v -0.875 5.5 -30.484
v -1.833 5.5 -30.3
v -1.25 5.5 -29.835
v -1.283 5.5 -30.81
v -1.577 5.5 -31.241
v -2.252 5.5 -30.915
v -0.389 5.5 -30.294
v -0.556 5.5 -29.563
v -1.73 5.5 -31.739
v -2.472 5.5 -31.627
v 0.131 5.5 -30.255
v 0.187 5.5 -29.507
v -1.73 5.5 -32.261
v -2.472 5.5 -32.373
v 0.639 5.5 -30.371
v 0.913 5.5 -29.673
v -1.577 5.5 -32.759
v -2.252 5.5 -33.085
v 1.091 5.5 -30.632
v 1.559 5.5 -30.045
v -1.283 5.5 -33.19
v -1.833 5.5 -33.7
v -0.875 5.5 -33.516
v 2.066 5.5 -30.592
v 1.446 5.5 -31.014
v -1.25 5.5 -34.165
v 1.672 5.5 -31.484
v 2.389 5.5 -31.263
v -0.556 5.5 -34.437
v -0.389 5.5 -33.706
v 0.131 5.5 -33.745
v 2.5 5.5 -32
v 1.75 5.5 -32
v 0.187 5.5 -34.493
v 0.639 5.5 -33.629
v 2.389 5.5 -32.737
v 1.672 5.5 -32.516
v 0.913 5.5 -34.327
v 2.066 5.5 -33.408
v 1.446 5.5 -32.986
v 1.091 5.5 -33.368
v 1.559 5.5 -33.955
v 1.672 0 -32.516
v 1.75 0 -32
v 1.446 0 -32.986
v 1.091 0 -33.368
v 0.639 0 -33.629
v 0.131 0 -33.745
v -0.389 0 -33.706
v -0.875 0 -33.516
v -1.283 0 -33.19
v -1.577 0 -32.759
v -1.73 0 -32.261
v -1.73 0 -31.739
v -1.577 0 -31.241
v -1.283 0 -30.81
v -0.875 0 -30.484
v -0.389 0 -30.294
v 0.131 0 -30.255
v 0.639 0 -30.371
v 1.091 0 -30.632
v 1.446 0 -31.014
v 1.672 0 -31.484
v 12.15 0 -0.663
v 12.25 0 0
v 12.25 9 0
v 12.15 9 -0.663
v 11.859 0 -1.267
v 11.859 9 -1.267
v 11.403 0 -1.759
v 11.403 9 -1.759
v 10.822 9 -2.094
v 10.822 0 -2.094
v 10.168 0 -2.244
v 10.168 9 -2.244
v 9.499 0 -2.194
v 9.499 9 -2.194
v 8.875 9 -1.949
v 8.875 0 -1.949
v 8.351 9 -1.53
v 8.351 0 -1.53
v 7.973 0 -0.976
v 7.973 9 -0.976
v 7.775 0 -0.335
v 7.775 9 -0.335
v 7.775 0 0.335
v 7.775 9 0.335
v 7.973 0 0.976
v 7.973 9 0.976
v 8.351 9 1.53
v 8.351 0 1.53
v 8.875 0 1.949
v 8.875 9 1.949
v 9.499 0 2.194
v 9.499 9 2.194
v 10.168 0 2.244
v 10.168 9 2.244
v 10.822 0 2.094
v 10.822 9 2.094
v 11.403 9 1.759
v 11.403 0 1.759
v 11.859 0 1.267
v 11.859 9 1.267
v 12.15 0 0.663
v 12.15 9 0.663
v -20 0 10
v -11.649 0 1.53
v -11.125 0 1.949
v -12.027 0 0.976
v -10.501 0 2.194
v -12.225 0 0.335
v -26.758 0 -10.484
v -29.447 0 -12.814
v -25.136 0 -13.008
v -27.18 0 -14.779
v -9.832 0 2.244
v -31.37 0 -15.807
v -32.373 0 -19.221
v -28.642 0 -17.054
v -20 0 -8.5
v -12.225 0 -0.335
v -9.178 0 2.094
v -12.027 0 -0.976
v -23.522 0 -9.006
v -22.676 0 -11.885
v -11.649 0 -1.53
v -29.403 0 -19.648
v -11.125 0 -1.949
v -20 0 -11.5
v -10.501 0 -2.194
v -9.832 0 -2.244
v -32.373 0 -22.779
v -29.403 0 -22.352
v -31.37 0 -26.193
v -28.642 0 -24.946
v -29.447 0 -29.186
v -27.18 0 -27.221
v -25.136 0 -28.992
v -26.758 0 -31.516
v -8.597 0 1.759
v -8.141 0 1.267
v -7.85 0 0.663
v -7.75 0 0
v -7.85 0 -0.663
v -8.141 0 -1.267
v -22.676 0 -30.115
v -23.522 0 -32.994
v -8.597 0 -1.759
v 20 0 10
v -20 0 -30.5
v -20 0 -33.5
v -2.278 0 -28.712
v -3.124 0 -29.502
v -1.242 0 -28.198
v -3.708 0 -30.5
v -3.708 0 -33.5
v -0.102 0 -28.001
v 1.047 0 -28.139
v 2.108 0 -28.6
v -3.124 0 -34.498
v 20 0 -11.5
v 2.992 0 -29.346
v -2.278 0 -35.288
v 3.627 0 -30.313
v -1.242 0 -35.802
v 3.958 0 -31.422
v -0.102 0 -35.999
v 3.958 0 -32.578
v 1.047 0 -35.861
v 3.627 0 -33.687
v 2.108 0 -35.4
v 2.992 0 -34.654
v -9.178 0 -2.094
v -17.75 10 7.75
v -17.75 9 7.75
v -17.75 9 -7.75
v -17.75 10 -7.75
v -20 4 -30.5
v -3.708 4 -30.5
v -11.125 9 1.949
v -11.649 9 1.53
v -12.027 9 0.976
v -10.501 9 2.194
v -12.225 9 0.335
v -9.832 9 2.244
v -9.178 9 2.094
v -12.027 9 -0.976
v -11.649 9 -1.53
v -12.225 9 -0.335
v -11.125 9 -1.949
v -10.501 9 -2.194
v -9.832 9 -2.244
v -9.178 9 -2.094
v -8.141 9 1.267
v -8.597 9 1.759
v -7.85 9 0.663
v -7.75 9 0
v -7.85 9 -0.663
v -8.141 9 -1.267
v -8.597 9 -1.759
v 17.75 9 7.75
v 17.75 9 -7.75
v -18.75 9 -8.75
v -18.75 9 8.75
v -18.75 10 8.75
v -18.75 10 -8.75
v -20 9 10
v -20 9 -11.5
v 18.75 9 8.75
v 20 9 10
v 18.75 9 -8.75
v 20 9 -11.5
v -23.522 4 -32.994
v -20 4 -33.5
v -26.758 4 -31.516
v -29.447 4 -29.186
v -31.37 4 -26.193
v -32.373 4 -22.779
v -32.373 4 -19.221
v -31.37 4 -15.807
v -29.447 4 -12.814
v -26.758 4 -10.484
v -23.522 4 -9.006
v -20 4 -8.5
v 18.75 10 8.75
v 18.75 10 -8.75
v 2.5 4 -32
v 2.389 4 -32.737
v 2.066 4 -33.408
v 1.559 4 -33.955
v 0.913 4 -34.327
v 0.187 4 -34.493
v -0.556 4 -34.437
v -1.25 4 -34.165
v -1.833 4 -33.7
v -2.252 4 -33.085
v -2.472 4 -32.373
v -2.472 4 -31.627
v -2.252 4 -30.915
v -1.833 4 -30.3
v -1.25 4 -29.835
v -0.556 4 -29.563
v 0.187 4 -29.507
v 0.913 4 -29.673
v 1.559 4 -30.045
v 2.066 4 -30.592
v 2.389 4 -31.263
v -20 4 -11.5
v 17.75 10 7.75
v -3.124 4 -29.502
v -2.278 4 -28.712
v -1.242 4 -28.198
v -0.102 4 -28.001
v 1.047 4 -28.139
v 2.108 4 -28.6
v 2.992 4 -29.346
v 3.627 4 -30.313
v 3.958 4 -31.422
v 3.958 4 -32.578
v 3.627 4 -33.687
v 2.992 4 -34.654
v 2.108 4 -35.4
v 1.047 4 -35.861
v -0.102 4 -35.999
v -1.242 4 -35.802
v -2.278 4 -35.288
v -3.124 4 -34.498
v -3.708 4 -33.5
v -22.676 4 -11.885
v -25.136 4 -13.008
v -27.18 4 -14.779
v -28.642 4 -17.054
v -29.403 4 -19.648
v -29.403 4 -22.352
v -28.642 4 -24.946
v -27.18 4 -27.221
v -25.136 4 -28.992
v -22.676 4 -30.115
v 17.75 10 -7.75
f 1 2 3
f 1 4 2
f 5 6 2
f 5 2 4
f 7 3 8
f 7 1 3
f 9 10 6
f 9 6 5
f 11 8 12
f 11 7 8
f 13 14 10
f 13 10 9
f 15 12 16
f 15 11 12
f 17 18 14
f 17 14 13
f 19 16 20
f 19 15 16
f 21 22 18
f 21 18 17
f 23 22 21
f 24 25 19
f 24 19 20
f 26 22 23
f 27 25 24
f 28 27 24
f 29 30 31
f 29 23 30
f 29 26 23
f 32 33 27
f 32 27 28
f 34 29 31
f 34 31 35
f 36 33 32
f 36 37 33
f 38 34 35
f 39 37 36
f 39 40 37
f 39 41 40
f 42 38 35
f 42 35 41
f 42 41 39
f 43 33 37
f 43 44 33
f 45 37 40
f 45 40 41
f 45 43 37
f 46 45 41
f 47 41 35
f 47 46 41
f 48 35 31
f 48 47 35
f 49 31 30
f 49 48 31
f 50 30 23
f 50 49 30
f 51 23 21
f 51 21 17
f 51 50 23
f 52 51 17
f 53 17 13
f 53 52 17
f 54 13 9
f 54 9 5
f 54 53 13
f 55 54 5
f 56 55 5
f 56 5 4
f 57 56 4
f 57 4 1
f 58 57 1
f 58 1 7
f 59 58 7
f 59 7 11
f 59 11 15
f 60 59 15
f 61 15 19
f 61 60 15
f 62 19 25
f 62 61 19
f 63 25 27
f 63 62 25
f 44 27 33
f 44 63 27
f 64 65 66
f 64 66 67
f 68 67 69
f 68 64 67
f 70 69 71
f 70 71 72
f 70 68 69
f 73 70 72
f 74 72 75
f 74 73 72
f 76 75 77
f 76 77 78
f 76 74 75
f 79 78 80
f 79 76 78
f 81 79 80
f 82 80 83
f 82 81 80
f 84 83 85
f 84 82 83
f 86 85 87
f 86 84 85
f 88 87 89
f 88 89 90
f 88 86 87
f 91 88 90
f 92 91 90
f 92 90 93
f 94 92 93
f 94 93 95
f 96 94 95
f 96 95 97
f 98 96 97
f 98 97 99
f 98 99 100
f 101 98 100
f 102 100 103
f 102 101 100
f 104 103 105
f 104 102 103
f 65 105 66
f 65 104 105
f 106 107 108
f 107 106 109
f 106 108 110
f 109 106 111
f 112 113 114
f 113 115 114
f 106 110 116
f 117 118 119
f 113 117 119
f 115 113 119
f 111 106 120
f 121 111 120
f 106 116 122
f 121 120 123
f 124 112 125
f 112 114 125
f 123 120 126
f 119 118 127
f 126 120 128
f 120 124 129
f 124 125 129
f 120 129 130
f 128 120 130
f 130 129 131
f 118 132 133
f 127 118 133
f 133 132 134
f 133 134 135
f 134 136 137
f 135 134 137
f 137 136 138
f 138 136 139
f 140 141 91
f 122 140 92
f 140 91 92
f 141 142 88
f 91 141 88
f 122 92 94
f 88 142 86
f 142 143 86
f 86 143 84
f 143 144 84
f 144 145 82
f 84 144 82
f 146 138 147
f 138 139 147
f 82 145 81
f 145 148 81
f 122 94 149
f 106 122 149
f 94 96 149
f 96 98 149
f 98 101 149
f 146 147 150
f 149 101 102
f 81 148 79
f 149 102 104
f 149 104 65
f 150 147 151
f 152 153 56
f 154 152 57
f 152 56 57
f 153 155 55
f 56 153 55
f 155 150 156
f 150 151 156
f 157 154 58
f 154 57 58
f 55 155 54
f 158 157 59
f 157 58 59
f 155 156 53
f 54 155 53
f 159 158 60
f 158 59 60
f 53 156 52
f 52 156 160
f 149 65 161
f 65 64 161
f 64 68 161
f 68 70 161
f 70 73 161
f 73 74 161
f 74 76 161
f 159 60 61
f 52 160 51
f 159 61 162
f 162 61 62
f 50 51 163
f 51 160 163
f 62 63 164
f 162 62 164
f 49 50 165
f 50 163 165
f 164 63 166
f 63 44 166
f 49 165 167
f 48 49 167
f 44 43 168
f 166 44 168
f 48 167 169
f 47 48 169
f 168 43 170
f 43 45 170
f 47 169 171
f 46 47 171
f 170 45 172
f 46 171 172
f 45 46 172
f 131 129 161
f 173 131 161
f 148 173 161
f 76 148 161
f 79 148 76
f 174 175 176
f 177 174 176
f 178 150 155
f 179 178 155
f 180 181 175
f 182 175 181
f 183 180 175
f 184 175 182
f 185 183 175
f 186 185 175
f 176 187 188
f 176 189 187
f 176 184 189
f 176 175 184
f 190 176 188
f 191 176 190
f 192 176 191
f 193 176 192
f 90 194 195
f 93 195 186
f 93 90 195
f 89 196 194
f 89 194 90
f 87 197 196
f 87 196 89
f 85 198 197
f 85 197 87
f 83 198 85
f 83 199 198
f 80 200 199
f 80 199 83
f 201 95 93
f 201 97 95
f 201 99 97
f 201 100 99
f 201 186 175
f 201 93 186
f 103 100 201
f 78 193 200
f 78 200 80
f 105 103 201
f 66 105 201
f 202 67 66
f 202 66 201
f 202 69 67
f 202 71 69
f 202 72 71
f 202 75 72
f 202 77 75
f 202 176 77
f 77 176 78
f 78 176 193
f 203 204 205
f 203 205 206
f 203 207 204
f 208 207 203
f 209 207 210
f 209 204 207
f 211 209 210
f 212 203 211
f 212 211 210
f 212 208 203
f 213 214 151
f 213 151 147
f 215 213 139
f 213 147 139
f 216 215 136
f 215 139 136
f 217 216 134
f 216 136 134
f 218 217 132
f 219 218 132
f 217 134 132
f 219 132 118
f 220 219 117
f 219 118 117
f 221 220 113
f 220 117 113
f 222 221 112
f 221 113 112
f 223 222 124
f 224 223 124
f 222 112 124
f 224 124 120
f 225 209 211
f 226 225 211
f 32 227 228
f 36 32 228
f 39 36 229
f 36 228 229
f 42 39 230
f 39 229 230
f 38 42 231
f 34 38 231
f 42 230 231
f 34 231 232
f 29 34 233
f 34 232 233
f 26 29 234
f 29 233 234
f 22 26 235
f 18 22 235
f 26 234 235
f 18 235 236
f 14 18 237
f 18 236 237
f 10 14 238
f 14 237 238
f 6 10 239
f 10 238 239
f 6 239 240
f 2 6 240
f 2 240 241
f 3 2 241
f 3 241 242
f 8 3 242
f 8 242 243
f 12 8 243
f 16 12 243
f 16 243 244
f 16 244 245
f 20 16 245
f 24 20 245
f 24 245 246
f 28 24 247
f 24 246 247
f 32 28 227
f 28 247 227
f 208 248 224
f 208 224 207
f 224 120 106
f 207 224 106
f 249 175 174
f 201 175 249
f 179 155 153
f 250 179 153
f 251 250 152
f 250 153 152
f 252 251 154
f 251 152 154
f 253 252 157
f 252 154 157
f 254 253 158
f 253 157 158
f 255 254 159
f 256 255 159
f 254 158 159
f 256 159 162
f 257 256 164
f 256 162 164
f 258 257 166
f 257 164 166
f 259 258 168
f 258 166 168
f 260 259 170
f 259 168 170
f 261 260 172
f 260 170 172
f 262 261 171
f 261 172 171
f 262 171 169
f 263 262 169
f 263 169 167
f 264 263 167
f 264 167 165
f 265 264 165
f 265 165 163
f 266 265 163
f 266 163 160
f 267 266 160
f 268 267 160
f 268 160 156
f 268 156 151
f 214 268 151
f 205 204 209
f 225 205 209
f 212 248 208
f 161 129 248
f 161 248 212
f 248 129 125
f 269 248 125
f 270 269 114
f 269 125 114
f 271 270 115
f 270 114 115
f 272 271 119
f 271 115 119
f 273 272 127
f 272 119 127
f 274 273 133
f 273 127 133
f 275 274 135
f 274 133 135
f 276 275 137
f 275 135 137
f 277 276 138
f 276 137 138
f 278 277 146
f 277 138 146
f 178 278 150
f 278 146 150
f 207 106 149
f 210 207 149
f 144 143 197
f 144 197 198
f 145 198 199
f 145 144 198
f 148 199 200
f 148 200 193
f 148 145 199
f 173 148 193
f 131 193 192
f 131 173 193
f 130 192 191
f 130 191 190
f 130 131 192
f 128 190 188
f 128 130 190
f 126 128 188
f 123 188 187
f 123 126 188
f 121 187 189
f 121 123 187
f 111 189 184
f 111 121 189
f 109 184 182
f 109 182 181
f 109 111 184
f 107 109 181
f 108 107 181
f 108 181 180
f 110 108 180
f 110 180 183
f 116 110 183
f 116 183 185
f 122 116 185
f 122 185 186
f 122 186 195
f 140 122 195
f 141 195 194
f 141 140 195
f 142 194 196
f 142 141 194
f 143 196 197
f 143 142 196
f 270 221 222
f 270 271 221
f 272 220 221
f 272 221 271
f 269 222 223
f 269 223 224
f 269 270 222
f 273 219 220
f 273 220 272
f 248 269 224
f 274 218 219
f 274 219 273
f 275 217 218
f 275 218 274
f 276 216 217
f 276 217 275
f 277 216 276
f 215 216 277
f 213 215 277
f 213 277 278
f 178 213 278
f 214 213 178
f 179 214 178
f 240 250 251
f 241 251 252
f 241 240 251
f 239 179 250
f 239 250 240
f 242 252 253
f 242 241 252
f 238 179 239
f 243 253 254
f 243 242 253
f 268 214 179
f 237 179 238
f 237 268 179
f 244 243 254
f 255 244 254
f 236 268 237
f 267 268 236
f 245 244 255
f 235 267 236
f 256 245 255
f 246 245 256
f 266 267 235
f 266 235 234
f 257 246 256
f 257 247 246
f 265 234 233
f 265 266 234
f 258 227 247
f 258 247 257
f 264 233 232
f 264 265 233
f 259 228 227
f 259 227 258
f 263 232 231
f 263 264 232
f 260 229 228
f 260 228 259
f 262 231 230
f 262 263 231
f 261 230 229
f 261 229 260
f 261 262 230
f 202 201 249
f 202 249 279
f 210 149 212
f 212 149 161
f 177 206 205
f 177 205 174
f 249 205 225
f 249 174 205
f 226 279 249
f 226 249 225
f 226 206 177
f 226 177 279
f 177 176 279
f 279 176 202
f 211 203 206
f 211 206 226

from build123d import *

# Parameters (mm, degrees)
SKETCH1_W           = 40
SKETCH1_H           = 21.5
SKETCH1_R           = 2.25
BOSS_EXTRUDE3_DEPTH = 9
SKETCH1_5_R         = 1.75
BOSS_EXTRUDE4_DEPTH = 4
SKETCH2_R           = 2.5
SKETCH2_R_2         = 1.75
BOSS_EXTRUDE5_DEPTH = 1.5
SKETCH3_W           = 37.5
SKETCH3_H           = 17.5
SKETCH3_W_2         = 35.5
SKETCH3_H_2         = 15.5
BOSS_EXTRUDE6_DEPTH = 1


with BuildPart() as part:
    # Sketch1 → Boss-Extrude3 (new body)
    with BuildSketch(Plane(origin=(0, 0, 0), x_dir=(1, 0, 0), z_dir=(0, 1, 0))):
        with Locations((0, 0.75)):
            Rectangle(SKETCH1_W, SKETCH1_H)
        with Locations((10, 0)):
            Circle(SKETCH1_R, mode=Mode.SUBTRACT)
        with Locations((-10, 0)):
            Circle(SKETCH1_R, mode=Mode.SUBTRACT)
    extrude(amount=BOSS_EXTRUDE3_DEPTH)

    # Sketch1<5> → Boss-Extrude4 (add)
    with BuildSketch(Plane(origin=(0, 0, 0), x_dir=(1, 0, 0), z_dir=(0, 1, 0))):
        with BuildLine():
            ThreePointArc((-20, 33.5), (-32.5, 21), (-20, 8.5))
            Line((-20, 8.5), (-20, 10))
            Line((-20, 10), (-20, 11.5))
            ThreePointArc((-20, 11.5), (-29.5, 21), (-20, 30.5))
            Line((-20, 30.5), (-3.708099244, 30.5))
            ThreePointArc((-3.708099244, 30.5), (4, 32), (-3.708099244, 33.5))
            Line((-3.708099244, 33.5), (-20, 33.5))
        make_face()
        with Locations((0, 32)):
            Circle(SKETCH1_5_R, mode=Mode.SUBTRACT)
    extrude(amount=BOSS_EXTRUDE4_DEPTH)

    # Sketch2 → Boss-Extrude5 (add)
    with BuildSketch(Plane(origin=(0, 4, 0), x_dir=(1, 0, 0), z_dir=(0, 1, 0))):
        with Locations((0, 32)):
            Circle(SKETCH2_R)
        with Locations((0, 32)):
            Circle(SKETCH2_R_2, mode=Mode.SUBTRACT)
    extrude(amount=BOSS_EXTRUDE5_DEPTH)

    # Sketch3 → Boss-Extrude6 (add)
    with BuildSketch(Plane(origin=(0, 9, 0), x_dir=(1, 0, 0), z_dir=(0, 1, 0))):
        Rectangle(SKETCH3_W, SKETCH3_H)
        Rectangle(SKETCH3_W_2, SKETCH3_H_2, mode=Mode.SUBTRACT)
    extrude(amount=BOSS_EXTRUDE6_DEPTH)


solid = part.part
